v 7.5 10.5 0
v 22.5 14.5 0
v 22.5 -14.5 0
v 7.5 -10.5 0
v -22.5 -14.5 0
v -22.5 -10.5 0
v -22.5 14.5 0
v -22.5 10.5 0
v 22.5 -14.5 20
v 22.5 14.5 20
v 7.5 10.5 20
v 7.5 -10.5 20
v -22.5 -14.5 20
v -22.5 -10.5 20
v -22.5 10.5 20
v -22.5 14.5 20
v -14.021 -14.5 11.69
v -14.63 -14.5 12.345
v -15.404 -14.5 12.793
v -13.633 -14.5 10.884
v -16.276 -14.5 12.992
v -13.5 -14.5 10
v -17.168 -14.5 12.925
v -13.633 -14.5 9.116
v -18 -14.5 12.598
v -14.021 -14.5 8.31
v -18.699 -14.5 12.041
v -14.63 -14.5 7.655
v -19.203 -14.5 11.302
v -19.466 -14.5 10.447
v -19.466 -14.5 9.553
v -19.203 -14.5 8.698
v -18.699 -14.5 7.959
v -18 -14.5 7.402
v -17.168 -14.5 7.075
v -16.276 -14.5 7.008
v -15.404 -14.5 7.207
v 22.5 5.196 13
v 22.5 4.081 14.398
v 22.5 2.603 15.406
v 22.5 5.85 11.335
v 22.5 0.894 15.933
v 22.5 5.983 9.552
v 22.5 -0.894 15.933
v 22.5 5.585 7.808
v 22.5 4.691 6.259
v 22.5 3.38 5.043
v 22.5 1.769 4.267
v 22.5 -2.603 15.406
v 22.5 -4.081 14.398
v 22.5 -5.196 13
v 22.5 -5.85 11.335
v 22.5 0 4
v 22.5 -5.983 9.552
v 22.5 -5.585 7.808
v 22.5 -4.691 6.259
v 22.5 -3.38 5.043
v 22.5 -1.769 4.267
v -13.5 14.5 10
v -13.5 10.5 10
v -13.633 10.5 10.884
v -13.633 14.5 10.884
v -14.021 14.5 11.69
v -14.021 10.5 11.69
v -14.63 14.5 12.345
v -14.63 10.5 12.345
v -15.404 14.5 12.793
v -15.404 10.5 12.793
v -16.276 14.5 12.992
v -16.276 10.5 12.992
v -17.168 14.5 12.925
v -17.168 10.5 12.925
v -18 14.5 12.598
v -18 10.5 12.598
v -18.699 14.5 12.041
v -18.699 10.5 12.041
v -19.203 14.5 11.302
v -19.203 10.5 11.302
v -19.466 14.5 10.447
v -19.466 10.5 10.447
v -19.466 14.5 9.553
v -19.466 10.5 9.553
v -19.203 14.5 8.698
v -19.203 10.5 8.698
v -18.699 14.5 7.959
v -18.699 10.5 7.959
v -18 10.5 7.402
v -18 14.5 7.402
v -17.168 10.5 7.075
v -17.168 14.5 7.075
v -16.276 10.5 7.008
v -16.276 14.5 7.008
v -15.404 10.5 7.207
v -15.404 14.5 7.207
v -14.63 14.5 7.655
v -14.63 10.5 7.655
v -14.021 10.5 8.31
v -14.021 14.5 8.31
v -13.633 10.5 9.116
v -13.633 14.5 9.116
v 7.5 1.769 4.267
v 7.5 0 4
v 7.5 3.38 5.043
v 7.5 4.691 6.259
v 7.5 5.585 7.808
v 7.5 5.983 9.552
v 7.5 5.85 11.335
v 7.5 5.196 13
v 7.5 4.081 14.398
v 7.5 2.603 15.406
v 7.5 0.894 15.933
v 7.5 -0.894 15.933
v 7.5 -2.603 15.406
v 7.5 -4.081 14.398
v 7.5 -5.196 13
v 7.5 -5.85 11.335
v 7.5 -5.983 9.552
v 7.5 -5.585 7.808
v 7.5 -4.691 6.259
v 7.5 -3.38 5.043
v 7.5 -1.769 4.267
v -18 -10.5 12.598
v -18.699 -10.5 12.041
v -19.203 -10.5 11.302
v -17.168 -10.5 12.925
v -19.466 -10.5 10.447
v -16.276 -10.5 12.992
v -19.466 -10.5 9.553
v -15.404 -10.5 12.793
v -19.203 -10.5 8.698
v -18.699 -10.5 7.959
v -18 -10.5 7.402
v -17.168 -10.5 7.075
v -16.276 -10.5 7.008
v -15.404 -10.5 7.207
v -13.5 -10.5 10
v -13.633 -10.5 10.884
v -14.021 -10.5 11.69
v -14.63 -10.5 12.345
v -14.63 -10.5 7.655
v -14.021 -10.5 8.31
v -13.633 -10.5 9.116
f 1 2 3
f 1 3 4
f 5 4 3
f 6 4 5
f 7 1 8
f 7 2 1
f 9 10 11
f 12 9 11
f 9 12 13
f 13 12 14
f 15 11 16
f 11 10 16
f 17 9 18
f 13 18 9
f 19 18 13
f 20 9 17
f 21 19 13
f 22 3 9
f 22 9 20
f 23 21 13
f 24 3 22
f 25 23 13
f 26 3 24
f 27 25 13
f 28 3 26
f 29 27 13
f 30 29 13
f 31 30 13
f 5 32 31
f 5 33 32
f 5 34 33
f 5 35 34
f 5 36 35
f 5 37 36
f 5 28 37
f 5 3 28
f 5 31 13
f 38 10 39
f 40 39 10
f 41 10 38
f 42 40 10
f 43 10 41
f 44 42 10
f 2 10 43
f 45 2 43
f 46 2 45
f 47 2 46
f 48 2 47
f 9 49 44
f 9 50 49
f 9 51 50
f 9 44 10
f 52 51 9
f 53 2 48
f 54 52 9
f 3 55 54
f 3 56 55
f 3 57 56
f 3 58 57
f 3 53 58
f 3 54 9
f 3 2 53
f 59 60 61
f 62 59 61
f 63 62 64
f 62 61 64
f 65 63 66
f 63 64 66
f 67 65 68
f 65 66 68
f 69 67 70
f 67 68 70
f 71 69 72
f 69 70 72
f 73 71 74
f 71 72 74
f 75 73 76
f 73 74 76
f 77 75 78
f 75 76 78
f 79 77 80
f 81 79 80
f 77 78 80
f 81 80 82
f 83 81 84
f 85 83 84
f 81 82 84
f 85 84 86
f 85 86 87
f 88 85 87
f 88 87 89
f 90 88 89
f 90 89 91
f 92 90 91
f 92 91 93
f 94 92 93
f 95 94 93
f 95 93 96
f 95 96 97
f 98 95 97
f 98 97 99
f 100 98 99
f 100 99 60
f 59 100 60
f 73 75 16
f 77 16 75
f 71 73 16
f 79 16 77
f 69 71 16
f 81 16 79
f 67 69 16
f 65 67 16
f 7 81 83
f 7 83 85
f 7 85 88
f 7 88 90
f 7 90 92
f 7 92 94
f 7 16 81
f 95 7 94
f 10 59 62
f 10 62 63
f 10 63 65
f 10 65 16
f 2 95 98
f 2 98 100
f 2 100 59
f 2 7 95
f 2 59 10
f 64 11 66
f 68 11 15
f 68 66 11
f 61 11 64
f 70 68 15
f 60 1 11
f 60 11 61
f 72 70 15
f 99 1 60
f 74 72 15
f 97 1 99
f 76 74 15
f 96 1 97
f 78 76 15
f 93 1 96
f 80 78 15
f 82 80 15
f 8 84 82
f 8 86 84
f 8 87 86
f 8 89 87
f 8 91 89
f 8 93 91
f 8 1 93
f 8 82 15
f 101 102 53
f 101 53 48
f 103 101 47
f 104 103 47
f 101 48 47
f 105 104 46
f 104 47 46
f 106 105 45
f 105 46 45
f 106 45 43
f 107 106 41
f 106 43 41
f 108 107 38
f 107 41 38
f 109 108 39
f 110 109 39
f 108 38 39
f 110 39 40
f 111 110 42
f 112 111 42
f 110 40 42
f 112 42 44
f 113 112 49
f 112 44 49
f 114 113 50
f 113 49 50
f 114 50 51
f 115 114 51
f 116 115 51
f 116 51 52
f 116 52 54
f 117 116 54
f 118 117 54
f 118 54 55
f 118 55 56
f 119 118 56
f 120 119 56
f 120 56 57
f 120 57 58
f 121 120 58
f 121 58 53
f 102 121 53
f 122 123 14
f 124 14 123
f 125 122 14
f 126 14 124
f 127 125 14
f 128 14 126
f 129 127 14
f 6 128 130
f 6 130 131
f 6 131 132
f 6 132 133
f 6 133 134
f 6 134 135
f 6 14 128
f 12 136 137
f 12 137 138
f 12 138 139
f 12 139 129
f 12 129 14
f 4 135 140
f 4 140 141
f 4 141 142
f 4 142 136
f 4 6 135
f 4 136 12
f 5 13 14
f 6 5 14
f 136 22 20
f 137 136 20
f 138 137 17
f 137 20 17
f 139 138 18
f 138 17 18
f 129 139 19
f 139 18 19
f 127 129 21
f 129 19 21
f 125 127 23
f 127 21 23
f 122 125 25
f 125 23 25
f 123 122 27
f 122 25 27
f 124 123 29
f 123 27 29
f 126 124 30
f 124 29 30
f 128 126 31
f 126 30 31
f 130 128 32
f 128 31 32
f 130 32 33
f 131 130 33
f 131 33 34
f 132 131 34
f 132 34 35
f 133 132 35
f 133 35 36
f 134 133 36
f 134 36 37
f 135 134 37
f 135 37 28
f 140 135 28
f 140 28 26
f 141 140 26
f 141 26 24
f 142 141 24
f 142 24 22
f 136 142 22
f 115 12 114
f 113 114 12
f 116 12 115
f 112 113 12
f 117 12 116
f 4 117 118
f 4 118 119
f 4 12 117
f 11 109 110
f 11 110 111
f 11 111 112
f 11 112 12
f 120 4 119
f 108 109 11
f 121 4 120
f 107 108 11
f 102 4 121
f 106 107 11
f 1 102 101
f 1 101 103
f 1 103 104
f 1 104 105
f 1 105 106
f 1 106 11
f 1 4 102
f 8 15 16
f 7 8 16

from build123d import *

# Parameters (mm, degrees)
Y_KSEKLIK_EKSTR_ZYON1_DEPTH = 20
IZIM2_R                     = 6
KES_EKSTR_ZYON1_DEPTH       = 20
IZIM3_R                     = 3
KES_EKSTR_ZYON2_DEPTH       = 40


with BuildPart() as part:
    # Çizim1 → Yükseklik-Ekstrüzyon1 (new body)
    with BuildSketch(Plane.XY):
        Polygon((-22.5, 14.5), (22.5, 14.5), (22.5, -14.5), (-22.5, -14.5), (-22.5, -10.5), (7.5, -10.5), (7.5, 10.5), (-22.5, 10.5), align=None)
    extrude(amount=Y_KSEKLIK_EKSTR_ZYON1_DEPTH)

    # Çizim2 → Kes-Ekstrüzyon1 (cut)
    with BuildSketch(Plane(origin=(22.5, 0, 0), x_dir=(0, 0, -1), z_dir=(1, 0, 0))):
        with Locations((-10, 0)):
            Circle(IZIM2_R)
    extrude(amount=-KES_EKSTR_ZYON1_DEPTH, mode=Mode.SUBTRACT)

    # Çizim3 → Kes-Ekstrüzyon2 (cut)
    with BuildSketch(Plane.XZ.offset(14.5)):
        with Locations((-16.5, 10)):
            Circle(IZIM3_R)
    extrude(amount=-KES_EKSTR_ZYON2_DEPTH, mode=Mode.SUBTRACT)


solid = part.part
